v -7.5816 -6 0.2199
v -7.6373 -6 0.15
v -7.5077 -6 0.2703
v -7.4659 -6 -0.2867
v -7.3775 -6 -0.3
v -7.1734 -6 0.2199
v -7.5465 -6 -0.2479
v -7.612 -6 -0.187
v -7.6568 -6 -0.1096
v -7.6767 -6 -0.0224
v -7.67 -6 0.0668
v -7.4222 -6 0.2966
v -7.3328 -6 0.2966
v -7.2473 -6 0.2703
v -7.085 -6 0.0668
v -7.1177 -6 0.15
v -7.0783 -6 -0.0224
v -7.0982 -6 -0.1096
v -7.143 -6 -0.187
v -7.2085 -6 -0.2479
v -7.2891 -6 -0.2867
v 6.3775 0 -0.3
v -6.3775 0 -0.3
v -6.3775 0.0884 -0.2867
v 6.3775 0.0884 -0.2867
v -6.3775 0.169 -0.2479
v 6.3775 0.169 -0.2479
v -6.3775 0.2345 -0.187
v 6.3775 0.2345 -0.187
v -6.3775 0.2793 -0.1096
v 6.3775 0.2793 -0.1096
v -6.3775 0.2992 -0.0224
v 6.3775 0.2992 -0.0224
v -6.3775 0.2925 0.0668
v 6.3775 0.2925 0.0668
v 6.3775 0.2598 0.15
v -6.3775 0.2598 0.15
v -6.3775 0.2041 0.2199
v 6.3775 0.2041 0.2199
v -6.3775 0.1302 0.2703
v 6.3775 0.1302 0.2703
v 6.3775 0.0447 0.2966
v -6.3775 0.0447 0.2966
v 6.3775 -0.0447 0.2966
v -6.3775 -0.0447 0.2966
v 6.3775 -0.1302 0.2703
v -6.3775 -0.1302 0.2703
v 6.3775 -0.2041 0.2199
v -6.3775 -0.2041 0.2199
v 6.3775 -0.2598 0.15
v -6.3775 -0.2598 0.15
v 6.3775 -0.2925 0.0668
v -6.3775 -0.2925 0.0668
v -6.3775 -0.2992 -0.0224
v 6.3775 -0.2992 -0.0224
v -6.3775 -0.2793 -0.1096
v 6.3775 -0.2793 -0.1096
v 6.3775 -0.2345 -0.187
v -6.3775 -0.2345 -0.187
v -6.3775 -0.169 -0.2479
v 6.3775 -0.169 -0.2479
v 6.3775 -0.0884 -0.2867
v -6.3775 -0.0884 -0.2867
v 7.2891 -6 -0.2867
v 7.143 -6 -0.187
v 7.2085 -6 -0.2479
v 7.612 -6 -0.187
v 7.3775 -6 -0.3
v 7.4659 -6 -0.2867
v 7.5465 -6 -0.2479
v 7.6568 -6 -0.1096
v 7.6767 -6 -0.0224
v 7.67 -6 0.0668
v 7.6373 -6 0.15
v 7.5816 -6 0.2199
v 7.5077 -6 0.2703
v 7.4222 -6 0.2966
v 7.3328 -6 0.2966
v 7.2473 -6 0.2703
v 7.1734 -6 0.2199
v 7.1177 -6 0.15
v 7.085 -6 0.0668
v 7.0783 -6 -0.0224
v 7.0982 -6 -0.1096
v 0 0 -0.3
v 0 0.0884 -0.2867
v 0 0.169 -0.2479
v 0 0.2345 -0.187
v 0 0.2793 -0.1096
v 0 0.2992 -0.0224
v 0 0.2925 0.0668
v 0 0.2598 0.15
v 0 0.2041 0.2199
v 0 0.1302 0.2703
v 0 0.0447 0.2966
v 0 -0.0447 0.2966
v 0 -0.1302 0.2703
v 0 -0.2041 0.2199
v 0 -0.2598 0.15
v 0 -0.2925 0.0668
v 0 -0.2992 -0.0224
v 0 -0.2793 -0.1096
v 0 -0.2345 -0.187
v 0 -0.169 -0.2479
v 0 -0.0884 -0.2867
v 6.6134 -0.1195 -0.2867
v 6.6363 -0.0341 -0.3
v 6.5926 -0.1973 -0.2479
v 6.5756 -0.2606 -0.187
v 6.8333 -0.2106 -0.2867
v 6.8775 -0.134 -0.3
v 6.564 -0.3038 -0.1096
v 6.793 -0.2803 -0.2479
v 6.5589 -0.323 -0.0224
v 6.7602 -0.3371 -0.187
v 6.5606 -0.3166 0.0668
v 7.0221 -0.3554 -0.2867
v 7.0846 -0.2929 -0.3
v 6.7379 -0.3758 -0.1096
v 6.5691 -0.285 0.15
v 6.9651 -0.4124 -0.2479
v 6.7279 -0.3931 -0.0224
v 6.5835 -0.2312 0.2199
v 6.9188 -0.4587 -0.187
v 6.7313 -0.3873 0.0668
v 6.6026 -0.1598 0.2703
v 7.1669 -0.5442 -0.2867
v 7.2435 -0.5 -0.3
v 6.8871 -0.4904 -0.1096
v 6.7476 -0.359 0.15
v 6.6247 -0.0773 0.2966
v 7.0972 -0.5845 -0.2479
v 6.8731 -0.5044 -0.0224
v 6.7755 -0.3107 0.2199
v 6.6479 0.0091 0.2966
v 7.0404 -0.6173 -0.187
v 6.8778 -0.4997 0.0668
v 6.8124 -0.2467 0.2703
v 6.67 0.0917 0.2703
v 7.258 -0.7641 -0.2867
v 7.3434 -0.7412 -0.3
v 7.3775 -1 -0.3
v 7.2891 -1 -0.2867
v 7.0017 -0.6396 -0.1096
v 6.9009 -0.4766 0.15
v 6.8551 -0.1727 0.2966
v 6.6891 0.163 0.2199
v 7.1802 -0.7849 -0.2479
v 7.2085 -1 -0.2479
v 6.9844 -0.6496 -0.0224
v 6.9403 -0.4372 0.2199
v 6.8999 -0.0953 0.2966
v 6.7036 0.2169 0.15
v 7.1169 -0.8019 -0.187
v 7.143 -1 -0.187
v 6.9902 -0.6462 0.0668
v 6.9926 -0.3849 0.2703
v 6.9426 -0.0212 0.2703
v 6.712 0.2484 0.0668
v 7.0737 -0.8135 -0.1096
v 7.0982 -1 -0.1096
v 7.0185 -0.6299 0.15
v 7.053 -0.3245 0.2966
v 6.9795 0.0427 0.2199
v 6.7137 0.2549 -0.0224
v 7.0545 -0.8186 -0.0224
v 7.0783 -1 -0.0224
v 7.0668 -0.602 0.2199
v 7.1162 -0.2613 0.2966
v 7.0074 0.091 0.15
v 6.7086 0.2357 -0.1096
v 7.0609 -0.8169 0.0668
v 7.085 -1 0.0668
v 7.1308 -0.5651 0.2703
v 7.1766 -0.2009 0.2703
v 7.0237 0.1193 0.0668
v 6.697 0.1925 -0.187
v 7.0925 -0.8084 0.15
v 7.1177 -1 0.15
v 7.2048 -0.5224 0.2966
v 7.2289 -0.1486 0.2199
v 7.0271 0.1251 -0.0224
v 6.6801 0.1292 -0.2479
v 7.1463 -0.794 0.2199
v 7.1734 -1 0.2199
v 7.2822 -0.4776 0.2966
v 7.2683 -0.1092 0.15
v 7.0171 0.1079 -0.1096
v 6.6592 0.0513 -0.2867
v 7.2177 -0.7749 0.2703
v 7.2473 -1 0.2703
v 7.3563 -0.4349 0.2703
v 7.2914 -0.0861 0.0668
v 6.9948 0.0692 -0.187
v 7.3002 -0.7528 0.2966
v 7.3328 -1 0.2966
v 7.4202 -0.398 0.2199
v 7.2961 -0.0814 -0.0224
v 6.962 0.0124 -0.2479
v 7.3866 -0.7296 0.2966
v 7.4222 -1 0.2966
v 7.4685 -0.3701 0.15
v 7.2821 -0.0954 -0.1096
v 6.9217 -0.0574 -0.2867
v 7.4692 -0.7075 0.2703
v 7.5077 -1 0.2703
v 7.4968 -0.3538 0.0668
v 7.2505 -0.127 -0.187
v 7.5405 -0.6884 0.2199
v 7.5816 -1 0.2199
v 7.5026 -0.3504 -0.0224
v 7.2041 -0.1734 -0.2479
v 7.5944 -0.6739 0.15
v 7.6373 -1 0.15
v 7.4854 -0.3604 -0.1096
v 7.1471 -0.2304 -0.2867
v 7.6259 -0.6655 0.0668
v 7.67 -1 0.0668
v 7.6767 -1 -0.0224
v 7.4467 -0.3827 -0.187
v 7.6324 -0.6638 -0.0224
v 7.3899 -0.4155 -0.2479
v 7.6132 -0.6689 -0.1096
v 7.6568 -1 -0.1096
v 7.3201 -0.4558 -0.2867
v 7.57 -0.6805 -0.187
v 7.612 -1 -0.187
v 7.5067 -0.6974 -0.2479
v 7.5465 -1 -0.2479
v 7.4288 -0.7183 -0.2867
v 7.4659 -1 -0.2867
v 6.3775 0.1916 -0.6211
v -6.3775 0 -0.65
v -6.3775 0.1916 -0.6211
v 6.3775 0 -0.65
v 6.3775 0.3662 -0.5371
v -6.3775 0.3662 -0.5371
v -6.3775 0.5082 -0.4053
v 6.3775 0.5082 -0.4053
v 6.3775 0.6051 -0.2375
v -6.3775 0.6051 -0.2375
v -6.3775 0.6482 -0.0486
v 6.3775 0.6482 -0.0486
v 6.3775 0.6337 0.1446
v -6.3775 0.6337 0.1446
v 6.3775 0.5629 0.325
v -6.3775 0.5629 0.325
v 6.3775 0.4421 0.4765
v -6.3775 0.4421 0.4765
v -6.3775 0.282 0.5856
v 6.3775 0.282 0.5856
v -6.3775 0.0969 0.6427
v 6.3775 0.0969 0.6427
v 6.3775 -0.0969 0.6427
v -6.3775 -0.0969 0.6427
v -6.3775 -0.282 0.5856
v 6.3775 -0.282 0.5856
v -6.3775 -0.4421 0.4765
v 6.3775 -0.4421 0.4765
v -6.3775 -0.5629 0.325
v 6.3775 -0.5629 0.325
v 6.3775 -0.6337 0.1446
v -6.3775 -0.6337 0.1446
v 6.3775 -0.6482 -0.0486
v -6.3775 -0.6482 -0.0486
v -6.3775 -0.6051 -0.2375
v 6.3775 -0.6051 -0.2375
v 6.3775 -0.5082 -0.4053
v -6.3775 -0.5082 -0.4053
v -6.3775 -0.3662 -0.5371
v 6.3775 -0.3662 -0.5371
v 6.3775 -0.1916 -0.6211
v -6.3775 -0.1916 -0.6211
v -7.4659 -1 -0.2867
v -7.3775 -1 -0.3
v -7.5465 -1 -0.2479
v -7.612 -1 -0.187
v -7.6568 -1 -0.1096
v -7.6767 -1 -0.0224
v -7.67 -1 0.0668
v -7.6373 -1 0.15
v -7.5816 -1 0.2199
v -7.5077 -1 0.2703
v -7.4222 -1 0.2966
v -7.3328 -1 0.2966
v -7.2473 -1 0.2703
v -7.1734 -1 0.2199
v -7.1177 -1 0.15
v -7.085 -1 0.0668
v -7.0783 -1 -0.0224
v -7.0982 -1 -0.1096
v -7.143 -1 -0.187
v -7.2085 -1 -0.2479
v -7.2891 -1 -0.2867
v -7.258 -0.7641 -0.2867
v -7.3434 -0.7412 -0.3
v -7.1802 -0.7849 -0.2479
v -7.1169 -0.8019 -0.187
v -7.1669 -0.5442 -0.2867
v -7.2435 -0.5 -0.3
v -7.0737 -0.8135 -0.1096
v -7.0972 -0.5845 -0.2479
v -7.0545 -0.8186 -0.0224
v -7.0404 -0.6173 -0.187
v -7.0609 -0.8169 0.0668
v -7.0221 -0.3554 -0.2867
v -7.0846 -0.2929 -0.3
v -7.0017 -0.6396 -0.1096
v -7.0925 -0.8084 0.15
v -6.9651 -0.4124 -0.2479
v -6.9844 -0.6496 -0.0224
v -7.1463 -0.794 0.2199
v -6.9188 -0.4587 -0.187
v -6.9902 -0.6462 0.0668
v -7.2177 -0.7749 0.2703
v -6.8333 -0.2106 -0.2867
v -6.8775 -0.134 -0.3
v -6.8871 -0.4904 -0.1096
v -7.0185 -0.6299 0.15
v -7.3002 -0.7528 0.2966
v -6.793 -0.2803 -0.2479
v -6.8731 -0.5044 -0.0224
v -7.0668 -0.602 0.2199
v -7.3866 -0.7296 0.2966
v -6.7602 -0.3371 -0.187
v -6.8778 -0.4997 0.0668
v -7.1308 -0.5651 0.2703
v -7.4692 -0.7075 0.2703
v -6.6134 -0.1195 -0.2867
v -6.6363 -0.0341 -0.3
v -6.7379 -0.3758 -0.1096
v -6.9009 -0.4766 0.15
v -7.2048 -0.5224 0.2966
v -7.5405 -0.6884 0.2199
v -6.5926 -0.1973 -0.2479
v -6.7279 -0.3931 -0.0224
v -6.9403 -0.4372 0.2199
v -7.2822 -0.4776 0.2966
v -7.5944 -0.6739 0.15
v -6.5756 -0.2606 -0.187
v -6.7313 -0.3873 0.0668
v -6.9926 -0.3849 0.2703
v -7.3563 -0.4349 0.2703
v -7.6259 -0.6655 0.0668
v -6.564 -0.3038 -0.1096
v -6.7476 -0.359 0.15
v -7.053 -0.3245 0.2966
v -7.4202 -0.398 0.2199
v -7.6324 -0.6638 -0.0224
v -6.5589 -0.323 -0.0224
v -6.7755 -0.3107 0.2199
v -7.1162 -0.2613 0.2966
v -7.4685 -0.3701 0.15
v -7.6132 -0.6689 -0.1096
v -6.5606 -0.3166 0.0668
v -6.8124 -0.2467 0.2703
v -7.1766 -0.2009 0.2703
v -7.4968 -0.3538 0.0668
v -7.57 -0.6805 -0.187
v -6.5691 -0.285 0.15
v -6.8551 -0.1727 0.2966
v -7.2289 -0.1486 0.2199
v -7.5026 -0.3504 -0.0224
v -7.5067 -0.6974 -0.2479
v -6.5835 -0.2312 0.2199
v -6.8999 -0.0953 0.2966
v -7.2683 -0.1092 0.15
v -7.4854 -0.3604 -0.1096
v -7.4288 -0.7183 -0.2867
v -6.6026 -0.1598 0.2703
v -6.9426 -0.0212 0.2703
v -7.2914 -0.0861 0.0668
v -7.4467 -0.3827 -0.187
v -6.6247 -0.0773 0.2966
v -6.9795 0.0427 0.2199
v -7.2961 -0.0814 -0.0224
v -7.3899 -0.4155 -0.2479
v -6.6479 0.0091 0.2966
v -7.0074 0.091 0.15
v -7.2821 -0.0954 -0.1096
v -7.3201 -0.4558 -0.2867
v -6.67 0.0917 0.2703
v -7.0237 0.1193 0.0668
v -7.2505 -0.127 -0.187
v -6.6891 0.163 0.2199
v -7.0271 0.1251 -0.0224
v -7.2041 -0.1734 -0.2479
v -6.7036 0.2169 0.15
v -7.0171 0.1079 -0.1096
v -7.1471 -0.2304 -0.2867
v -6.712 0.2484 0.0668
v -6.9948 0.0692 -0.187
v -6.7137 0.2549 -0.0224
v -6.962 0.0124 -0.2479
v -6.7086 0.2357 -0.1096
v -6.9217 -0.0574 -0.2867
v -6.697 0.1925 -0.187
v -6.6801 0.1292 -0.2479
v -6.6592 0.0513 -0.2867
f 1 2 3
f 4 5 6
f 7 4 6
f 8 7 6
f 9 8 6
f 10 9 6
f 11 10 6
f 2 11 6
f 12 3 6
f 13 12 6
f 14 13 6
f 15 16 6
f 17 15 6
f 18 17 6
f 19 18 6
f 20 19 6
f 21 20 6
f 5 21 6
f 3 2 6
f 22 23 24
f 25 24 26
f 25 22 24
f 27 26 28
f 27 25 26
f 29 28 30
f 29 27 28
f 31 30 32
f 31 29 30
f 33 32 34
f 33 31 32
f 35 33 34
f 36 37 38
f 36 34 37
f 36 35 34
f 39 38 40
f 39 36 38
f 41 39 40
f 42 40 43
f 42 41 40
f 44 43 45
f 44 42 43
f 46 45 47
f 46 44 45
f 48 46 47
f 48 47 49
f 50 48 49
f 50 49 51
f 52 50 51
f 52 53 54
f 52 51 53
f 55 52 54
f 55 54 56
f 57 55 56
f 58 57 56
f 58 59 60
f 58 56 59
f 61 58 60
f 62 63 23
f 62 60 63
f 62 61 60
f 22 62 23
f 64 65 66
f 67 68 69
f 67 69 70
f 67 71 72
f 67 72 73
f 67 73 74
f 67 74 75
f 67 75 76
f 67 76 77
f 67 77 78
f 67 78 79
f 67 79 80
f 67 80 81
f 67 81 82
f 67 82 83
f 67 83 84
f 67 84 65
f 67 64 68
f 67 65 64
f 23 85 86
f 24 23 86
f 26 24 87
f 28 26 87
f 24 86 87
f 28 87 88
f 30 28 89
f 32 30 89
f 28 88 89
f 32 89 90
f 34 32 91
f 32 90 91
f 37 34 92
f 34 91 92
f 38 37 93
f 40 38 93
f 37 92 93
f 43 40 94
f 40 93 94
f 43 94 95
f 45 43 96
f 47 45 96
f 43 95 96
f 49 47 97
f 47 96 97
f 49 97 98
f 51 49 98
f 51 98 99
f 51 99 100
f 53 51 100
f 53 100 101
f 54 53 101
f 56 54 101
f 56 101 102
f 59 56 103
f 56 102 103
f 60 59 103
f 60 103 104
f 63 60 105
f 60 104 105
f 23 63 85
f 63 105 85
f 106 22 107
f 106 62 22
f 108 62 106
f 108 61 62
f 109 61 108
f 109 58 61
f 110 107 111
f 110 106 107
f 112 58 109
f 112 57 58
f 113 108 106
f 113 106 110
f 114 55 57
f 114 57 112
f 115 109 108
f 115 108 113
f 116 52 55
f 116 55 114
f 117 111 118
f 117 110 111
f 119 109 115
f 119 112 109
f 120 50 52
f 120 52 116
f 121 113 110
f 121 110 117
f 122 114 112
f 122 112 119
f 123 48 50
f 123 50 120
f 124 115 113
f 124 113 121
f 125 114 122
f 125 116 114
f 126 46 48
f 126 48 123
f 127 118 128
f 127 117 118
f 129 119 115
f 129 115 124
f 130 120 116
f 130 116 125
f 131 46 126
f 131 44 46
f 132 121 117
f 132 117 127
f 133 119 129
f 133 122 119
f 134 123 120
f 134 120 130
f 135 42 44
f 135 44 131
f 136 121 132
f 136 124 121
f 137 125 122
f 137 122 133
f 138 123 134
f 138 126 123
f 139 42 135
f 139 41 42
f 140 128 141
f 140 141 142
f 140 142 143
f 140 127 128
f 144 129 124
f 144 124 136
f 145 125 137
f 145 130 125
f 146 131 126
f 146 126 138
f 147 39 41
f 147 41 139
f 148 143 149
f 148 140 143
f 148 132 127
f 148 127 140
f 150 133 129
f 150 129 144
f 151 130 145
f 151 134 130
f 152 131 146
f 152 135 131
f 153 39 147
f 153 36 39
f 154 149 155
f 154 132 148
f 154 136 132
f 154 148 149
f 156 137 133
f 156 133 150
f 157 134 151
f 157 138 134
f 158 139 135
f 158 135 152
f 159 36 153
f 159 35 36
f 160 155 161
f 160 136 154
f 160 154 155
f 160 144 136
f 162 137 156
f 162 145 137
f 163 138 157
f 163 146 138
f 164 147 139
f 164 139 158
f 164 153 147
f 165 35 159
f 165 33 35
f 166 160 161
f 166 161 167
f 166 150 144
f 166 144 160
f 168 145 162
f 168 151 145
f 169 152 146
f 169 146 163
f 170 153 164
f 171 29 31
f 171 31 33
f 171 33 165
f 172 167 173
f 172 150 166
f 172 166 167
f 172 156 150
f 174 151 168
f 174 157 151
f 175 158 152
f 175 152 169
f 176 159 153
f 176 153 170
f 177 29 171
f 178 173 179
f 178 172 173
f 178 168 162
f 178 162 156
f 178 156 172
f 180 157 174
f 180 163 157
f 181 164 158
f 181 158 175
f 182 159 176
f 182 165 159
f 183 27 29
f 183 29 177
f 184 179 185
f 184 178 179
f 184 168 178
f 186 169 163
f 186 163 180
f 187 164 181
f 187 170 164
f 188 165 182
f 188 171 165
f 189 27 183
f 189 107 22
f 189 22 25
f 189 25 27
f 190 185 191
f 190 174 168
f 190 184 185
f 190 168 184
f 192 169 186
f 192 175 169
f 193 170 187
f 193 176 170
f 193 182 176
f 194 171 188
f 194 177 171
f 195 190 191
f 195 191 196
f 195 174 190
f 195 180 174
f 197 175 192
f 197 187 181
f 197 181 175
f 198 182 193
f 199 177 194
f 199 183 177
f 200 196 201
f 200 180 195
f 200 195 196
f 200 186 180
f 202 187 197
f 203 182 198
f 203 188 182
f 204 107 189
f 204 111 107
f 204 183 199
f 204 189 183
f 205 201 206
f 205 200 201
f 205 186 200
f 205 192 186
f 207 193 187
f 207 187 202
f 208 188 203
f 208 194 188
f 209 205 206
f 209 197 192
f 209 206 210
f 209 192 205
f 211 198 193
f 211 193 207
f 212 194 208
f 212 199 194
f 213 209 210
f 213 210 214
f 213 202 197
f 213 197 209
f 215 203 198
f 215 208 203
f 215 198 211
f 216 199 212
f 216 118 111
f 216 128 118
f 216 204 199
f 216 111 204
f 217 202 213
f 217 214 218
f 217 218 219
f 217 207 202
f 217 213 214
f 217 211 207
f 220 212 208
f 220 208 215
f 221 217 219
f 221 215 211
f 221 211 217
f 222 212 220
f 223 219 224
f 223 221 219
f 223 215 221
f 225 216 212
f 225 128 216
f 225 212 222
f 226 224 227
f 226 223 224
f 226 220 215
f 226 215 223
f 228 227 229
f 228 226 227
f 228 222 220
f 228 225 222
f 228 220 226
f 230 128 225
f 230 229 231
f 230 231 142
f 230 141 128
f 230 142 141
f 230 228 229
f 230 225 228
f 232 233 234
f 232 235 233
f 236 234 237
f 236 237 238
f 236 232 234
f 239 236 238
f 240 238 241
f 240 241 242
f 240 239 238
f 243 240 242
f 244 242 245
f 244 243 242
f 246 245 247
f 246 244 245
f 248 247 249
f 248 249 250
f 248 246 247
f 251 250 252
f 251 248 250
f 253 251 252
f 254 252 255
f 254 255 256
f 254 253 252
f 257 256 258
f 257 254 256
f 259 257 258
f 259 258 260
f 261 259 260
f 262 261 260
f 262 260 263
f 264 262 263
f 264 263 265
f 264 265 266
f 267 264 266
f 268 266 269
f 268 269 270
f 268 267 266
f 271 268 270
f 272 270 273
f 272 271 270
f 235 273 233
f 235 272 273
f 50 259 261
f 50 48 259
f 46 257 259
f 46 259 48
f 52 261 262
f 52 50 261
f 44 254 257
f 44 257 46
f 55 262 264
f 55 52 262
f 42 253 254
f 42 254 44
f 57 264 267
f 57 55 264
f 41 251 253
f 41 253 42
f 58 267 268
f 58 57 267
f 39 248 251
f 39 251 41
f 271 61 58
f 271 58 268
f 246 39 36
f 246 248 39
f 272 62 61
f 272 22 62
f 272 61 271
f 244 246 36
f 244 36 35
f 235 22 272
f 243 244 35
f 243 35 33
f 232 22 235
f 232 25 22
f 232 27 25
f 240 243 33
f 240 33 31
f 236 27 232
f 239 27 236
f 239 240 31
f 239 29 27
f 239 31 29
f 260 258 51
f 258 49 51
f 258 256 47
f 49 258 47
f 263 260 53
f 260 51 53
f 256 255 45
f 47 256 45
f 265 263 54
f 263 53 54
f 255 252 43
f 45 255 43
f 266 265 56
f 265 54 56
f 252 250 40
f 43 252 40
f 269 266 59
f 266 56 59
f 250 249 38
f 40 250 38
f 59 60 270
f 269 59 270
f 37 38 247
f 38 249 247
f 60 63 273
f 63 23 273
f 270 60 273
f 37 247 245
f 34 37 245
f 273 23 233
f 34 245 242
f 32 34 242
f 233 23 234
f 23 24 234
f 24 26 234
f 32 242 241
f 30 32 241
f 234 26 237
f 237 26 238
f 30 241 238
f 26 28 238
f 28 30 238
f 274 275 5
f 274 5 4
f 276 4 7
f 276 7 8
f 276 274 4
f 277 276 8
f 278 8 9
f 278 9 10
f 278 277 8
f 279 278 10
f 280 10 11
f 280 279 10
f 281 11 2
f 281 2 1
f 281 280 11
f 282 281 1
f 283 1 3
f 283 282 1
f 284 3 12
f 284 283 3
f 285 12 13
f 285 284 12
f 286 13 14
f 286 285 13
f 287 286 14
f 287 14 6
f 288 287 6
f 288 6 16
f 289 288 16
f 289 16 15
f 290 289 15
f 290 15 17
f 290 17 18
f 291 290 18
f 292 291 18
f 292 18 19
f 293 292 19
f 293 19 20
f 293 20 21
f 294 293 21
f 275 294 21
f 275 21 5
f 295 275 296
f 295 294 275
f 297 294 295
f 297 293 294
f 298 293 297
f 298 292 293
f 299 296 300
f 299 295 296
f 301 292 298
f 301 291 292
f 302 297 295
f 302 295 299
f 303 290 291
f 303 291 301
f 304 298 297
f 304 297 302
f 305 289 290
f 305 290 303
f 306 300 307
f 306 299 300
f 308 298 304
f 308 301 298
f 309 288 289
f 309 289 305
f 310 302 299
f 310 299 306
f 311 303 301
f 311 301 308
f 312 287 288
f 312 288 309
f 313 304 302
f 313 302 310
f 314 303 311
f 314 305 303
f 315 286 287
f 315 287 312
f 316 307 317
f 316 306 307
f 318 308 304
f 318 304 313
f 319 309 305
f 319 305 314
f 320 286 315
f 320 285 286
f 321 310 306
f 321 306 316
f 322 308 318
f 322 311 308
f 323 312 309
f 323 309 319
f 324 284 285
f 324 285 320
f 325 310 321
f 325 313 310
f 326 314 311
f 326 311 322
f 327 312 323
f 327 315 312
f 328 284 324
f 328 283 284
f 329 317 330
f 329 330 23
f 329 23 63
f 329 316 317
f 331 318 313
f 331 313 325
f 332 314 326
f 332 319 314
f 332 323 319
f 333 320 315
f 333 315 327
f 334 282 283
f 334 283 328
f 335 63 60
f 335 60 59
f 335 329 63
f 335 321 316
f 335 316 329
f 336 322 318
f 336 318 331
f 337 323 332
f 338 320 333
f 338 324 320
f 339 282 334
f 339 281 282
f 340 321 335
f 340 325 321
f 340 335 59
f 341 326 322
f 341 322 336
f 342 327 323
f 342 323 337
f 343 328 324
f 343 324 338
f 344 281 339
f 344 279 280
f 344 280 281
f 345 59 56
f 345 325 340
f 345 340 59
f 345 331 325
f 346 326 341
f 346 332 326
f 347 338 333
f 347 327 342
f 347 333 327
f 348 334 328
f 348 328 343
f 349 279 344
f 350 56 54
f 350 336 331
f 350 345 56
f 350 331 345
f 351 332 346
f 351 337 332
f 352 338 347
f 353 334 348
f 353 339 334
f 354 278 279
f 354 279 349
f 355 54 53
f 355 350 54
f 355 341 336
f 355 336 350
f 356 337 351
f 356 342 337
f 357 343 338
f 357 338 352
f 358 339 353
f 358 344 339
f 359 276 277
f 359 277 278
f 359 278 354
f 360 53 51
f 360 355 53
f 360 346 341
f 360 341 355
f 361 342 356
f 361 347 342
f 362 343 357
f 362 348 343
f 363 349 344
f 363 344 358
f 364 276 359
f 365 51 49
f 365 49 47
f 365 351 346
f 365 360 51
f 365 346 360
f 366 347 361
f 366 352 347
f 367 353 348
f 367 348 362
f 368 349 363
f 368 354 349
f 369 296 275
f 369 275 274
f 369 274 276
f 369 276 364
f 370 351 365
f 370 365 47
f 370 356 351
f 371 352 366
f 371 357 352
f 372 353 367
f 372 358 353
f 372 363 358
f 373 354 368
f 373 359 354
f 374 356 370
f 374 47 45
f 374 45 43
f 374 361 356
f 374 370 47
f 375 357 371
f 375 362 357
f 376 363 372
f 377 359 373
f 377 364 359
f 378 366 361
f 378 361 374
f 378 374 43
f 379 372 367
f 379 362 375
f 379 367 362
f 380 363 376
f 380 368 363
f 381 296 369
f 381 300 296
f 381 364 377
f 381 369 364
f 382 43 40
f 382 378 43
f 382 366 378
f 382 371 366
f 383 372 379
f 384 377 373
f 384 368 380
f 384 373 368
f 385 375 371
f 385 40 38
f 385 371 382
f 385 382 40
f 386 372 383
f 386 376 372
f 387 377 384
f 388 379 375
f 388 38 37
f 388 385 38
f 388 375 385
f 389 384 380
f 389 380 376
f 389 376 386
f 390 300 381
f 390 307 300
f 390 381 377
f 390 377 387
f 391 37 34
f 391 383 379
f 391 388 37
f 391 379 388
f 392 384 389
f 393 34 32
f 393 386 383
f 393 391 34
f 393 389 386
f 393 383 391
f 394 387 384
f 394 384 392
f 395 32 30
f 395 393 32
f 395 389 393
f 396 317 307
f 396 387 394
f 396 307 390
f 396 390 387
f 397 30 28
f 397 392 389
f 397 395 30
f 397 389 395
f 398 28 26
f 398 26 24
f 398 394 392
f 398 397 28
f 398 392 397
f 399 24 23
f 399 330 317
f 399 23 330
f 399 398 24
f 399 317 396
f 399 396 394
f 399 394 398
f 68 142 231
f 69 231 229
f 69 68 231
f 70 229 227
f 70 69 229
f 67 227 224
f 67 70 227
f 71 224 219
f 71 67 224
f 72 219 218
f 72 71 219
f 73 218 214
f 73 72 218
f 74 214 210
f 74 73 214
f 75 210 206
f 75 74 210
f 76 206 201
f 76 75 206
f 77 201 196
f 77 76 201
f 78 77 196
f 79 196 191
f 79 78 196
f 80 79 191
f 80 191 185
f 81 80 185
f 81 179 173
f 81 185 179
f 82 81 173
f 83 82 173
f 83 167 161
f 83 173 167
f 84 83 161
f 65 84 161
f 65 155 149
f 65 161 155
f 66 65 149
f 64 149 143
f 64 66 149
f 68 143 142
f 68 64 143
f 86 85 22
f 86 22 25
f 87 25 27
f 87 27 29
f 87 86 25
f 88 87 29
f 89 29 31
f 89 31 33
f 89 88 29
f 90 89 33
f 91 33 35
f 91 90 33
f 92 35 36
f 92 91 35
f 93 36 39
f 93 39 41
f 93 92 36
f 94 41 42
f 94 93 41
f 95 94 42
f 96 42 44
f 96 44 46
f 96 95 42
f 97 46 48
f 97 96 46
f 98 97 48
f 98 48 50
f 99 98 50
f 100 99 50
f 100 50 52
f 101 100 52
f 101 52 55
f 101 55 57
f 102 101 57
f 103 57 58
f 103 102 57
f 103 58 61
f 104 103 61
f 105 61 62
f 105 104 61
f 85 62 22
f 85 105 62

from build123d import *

# Parameters (mm, degrees)
SKETCH2_R                = 0.3
SKETCH3_R                = 0.65
SKETCH3_R_2              = 0.3
BOSS_EXTRUDE1_DEPTH      = 6.3775
BOSS_EXTRUDE1_DEPTH_BACK = 6.3775


with BuildPart() as part:
    # Sweep1: sweep along a path in Sketch1
    with BuildLine(Plane.XY) as sweep1_path:
        Line((-7.3775, -6), (-7.3775, -1))
        ThreePointArc((-7.3775, -1), (-7.084606781, -0.292893219), (-6.3775, 0))
        Line((-6.3775, 0), (6.3775, 0))
        ThreePointArc((6.3775, 0), (7.084606781, -0.292893219), (7.3775, -1))
        Line((7.3775, -1), (7.3775, -6))
    # Sketch2 → Sweep1 (sweep)
    with BuildSketch(Plane(origin=(0, 0, 0), x_dir=(0, 0, -1), z_dir=(1, 0, 0))):
        Circle(SKETCH2_R)
    sweep(path=sweep1_path.line)


with BuildPart() as body_2:
    # Sketch3 → Boss-Extrude1 (new body, two sides)
    with BuildSketch(Plane(origin=(0, 0, 0), x_dir=(0, 0, -1), z_dir=(1, 0, 0))) as boss_extrude1_sk:
        Circle(SKETCH3_R)
        Circle(SKETCH3_R_2, mode=Mode.SUBTRACT)
    extrude(amount=BOSS_EXTRUDE1_DEPTH)
    extrude(boss_extrude1_sk.sketch, amount=-BOSS_EXTRUDE1_DEPTH_BACK)


solid = Compound([part.part, body_2.part])
